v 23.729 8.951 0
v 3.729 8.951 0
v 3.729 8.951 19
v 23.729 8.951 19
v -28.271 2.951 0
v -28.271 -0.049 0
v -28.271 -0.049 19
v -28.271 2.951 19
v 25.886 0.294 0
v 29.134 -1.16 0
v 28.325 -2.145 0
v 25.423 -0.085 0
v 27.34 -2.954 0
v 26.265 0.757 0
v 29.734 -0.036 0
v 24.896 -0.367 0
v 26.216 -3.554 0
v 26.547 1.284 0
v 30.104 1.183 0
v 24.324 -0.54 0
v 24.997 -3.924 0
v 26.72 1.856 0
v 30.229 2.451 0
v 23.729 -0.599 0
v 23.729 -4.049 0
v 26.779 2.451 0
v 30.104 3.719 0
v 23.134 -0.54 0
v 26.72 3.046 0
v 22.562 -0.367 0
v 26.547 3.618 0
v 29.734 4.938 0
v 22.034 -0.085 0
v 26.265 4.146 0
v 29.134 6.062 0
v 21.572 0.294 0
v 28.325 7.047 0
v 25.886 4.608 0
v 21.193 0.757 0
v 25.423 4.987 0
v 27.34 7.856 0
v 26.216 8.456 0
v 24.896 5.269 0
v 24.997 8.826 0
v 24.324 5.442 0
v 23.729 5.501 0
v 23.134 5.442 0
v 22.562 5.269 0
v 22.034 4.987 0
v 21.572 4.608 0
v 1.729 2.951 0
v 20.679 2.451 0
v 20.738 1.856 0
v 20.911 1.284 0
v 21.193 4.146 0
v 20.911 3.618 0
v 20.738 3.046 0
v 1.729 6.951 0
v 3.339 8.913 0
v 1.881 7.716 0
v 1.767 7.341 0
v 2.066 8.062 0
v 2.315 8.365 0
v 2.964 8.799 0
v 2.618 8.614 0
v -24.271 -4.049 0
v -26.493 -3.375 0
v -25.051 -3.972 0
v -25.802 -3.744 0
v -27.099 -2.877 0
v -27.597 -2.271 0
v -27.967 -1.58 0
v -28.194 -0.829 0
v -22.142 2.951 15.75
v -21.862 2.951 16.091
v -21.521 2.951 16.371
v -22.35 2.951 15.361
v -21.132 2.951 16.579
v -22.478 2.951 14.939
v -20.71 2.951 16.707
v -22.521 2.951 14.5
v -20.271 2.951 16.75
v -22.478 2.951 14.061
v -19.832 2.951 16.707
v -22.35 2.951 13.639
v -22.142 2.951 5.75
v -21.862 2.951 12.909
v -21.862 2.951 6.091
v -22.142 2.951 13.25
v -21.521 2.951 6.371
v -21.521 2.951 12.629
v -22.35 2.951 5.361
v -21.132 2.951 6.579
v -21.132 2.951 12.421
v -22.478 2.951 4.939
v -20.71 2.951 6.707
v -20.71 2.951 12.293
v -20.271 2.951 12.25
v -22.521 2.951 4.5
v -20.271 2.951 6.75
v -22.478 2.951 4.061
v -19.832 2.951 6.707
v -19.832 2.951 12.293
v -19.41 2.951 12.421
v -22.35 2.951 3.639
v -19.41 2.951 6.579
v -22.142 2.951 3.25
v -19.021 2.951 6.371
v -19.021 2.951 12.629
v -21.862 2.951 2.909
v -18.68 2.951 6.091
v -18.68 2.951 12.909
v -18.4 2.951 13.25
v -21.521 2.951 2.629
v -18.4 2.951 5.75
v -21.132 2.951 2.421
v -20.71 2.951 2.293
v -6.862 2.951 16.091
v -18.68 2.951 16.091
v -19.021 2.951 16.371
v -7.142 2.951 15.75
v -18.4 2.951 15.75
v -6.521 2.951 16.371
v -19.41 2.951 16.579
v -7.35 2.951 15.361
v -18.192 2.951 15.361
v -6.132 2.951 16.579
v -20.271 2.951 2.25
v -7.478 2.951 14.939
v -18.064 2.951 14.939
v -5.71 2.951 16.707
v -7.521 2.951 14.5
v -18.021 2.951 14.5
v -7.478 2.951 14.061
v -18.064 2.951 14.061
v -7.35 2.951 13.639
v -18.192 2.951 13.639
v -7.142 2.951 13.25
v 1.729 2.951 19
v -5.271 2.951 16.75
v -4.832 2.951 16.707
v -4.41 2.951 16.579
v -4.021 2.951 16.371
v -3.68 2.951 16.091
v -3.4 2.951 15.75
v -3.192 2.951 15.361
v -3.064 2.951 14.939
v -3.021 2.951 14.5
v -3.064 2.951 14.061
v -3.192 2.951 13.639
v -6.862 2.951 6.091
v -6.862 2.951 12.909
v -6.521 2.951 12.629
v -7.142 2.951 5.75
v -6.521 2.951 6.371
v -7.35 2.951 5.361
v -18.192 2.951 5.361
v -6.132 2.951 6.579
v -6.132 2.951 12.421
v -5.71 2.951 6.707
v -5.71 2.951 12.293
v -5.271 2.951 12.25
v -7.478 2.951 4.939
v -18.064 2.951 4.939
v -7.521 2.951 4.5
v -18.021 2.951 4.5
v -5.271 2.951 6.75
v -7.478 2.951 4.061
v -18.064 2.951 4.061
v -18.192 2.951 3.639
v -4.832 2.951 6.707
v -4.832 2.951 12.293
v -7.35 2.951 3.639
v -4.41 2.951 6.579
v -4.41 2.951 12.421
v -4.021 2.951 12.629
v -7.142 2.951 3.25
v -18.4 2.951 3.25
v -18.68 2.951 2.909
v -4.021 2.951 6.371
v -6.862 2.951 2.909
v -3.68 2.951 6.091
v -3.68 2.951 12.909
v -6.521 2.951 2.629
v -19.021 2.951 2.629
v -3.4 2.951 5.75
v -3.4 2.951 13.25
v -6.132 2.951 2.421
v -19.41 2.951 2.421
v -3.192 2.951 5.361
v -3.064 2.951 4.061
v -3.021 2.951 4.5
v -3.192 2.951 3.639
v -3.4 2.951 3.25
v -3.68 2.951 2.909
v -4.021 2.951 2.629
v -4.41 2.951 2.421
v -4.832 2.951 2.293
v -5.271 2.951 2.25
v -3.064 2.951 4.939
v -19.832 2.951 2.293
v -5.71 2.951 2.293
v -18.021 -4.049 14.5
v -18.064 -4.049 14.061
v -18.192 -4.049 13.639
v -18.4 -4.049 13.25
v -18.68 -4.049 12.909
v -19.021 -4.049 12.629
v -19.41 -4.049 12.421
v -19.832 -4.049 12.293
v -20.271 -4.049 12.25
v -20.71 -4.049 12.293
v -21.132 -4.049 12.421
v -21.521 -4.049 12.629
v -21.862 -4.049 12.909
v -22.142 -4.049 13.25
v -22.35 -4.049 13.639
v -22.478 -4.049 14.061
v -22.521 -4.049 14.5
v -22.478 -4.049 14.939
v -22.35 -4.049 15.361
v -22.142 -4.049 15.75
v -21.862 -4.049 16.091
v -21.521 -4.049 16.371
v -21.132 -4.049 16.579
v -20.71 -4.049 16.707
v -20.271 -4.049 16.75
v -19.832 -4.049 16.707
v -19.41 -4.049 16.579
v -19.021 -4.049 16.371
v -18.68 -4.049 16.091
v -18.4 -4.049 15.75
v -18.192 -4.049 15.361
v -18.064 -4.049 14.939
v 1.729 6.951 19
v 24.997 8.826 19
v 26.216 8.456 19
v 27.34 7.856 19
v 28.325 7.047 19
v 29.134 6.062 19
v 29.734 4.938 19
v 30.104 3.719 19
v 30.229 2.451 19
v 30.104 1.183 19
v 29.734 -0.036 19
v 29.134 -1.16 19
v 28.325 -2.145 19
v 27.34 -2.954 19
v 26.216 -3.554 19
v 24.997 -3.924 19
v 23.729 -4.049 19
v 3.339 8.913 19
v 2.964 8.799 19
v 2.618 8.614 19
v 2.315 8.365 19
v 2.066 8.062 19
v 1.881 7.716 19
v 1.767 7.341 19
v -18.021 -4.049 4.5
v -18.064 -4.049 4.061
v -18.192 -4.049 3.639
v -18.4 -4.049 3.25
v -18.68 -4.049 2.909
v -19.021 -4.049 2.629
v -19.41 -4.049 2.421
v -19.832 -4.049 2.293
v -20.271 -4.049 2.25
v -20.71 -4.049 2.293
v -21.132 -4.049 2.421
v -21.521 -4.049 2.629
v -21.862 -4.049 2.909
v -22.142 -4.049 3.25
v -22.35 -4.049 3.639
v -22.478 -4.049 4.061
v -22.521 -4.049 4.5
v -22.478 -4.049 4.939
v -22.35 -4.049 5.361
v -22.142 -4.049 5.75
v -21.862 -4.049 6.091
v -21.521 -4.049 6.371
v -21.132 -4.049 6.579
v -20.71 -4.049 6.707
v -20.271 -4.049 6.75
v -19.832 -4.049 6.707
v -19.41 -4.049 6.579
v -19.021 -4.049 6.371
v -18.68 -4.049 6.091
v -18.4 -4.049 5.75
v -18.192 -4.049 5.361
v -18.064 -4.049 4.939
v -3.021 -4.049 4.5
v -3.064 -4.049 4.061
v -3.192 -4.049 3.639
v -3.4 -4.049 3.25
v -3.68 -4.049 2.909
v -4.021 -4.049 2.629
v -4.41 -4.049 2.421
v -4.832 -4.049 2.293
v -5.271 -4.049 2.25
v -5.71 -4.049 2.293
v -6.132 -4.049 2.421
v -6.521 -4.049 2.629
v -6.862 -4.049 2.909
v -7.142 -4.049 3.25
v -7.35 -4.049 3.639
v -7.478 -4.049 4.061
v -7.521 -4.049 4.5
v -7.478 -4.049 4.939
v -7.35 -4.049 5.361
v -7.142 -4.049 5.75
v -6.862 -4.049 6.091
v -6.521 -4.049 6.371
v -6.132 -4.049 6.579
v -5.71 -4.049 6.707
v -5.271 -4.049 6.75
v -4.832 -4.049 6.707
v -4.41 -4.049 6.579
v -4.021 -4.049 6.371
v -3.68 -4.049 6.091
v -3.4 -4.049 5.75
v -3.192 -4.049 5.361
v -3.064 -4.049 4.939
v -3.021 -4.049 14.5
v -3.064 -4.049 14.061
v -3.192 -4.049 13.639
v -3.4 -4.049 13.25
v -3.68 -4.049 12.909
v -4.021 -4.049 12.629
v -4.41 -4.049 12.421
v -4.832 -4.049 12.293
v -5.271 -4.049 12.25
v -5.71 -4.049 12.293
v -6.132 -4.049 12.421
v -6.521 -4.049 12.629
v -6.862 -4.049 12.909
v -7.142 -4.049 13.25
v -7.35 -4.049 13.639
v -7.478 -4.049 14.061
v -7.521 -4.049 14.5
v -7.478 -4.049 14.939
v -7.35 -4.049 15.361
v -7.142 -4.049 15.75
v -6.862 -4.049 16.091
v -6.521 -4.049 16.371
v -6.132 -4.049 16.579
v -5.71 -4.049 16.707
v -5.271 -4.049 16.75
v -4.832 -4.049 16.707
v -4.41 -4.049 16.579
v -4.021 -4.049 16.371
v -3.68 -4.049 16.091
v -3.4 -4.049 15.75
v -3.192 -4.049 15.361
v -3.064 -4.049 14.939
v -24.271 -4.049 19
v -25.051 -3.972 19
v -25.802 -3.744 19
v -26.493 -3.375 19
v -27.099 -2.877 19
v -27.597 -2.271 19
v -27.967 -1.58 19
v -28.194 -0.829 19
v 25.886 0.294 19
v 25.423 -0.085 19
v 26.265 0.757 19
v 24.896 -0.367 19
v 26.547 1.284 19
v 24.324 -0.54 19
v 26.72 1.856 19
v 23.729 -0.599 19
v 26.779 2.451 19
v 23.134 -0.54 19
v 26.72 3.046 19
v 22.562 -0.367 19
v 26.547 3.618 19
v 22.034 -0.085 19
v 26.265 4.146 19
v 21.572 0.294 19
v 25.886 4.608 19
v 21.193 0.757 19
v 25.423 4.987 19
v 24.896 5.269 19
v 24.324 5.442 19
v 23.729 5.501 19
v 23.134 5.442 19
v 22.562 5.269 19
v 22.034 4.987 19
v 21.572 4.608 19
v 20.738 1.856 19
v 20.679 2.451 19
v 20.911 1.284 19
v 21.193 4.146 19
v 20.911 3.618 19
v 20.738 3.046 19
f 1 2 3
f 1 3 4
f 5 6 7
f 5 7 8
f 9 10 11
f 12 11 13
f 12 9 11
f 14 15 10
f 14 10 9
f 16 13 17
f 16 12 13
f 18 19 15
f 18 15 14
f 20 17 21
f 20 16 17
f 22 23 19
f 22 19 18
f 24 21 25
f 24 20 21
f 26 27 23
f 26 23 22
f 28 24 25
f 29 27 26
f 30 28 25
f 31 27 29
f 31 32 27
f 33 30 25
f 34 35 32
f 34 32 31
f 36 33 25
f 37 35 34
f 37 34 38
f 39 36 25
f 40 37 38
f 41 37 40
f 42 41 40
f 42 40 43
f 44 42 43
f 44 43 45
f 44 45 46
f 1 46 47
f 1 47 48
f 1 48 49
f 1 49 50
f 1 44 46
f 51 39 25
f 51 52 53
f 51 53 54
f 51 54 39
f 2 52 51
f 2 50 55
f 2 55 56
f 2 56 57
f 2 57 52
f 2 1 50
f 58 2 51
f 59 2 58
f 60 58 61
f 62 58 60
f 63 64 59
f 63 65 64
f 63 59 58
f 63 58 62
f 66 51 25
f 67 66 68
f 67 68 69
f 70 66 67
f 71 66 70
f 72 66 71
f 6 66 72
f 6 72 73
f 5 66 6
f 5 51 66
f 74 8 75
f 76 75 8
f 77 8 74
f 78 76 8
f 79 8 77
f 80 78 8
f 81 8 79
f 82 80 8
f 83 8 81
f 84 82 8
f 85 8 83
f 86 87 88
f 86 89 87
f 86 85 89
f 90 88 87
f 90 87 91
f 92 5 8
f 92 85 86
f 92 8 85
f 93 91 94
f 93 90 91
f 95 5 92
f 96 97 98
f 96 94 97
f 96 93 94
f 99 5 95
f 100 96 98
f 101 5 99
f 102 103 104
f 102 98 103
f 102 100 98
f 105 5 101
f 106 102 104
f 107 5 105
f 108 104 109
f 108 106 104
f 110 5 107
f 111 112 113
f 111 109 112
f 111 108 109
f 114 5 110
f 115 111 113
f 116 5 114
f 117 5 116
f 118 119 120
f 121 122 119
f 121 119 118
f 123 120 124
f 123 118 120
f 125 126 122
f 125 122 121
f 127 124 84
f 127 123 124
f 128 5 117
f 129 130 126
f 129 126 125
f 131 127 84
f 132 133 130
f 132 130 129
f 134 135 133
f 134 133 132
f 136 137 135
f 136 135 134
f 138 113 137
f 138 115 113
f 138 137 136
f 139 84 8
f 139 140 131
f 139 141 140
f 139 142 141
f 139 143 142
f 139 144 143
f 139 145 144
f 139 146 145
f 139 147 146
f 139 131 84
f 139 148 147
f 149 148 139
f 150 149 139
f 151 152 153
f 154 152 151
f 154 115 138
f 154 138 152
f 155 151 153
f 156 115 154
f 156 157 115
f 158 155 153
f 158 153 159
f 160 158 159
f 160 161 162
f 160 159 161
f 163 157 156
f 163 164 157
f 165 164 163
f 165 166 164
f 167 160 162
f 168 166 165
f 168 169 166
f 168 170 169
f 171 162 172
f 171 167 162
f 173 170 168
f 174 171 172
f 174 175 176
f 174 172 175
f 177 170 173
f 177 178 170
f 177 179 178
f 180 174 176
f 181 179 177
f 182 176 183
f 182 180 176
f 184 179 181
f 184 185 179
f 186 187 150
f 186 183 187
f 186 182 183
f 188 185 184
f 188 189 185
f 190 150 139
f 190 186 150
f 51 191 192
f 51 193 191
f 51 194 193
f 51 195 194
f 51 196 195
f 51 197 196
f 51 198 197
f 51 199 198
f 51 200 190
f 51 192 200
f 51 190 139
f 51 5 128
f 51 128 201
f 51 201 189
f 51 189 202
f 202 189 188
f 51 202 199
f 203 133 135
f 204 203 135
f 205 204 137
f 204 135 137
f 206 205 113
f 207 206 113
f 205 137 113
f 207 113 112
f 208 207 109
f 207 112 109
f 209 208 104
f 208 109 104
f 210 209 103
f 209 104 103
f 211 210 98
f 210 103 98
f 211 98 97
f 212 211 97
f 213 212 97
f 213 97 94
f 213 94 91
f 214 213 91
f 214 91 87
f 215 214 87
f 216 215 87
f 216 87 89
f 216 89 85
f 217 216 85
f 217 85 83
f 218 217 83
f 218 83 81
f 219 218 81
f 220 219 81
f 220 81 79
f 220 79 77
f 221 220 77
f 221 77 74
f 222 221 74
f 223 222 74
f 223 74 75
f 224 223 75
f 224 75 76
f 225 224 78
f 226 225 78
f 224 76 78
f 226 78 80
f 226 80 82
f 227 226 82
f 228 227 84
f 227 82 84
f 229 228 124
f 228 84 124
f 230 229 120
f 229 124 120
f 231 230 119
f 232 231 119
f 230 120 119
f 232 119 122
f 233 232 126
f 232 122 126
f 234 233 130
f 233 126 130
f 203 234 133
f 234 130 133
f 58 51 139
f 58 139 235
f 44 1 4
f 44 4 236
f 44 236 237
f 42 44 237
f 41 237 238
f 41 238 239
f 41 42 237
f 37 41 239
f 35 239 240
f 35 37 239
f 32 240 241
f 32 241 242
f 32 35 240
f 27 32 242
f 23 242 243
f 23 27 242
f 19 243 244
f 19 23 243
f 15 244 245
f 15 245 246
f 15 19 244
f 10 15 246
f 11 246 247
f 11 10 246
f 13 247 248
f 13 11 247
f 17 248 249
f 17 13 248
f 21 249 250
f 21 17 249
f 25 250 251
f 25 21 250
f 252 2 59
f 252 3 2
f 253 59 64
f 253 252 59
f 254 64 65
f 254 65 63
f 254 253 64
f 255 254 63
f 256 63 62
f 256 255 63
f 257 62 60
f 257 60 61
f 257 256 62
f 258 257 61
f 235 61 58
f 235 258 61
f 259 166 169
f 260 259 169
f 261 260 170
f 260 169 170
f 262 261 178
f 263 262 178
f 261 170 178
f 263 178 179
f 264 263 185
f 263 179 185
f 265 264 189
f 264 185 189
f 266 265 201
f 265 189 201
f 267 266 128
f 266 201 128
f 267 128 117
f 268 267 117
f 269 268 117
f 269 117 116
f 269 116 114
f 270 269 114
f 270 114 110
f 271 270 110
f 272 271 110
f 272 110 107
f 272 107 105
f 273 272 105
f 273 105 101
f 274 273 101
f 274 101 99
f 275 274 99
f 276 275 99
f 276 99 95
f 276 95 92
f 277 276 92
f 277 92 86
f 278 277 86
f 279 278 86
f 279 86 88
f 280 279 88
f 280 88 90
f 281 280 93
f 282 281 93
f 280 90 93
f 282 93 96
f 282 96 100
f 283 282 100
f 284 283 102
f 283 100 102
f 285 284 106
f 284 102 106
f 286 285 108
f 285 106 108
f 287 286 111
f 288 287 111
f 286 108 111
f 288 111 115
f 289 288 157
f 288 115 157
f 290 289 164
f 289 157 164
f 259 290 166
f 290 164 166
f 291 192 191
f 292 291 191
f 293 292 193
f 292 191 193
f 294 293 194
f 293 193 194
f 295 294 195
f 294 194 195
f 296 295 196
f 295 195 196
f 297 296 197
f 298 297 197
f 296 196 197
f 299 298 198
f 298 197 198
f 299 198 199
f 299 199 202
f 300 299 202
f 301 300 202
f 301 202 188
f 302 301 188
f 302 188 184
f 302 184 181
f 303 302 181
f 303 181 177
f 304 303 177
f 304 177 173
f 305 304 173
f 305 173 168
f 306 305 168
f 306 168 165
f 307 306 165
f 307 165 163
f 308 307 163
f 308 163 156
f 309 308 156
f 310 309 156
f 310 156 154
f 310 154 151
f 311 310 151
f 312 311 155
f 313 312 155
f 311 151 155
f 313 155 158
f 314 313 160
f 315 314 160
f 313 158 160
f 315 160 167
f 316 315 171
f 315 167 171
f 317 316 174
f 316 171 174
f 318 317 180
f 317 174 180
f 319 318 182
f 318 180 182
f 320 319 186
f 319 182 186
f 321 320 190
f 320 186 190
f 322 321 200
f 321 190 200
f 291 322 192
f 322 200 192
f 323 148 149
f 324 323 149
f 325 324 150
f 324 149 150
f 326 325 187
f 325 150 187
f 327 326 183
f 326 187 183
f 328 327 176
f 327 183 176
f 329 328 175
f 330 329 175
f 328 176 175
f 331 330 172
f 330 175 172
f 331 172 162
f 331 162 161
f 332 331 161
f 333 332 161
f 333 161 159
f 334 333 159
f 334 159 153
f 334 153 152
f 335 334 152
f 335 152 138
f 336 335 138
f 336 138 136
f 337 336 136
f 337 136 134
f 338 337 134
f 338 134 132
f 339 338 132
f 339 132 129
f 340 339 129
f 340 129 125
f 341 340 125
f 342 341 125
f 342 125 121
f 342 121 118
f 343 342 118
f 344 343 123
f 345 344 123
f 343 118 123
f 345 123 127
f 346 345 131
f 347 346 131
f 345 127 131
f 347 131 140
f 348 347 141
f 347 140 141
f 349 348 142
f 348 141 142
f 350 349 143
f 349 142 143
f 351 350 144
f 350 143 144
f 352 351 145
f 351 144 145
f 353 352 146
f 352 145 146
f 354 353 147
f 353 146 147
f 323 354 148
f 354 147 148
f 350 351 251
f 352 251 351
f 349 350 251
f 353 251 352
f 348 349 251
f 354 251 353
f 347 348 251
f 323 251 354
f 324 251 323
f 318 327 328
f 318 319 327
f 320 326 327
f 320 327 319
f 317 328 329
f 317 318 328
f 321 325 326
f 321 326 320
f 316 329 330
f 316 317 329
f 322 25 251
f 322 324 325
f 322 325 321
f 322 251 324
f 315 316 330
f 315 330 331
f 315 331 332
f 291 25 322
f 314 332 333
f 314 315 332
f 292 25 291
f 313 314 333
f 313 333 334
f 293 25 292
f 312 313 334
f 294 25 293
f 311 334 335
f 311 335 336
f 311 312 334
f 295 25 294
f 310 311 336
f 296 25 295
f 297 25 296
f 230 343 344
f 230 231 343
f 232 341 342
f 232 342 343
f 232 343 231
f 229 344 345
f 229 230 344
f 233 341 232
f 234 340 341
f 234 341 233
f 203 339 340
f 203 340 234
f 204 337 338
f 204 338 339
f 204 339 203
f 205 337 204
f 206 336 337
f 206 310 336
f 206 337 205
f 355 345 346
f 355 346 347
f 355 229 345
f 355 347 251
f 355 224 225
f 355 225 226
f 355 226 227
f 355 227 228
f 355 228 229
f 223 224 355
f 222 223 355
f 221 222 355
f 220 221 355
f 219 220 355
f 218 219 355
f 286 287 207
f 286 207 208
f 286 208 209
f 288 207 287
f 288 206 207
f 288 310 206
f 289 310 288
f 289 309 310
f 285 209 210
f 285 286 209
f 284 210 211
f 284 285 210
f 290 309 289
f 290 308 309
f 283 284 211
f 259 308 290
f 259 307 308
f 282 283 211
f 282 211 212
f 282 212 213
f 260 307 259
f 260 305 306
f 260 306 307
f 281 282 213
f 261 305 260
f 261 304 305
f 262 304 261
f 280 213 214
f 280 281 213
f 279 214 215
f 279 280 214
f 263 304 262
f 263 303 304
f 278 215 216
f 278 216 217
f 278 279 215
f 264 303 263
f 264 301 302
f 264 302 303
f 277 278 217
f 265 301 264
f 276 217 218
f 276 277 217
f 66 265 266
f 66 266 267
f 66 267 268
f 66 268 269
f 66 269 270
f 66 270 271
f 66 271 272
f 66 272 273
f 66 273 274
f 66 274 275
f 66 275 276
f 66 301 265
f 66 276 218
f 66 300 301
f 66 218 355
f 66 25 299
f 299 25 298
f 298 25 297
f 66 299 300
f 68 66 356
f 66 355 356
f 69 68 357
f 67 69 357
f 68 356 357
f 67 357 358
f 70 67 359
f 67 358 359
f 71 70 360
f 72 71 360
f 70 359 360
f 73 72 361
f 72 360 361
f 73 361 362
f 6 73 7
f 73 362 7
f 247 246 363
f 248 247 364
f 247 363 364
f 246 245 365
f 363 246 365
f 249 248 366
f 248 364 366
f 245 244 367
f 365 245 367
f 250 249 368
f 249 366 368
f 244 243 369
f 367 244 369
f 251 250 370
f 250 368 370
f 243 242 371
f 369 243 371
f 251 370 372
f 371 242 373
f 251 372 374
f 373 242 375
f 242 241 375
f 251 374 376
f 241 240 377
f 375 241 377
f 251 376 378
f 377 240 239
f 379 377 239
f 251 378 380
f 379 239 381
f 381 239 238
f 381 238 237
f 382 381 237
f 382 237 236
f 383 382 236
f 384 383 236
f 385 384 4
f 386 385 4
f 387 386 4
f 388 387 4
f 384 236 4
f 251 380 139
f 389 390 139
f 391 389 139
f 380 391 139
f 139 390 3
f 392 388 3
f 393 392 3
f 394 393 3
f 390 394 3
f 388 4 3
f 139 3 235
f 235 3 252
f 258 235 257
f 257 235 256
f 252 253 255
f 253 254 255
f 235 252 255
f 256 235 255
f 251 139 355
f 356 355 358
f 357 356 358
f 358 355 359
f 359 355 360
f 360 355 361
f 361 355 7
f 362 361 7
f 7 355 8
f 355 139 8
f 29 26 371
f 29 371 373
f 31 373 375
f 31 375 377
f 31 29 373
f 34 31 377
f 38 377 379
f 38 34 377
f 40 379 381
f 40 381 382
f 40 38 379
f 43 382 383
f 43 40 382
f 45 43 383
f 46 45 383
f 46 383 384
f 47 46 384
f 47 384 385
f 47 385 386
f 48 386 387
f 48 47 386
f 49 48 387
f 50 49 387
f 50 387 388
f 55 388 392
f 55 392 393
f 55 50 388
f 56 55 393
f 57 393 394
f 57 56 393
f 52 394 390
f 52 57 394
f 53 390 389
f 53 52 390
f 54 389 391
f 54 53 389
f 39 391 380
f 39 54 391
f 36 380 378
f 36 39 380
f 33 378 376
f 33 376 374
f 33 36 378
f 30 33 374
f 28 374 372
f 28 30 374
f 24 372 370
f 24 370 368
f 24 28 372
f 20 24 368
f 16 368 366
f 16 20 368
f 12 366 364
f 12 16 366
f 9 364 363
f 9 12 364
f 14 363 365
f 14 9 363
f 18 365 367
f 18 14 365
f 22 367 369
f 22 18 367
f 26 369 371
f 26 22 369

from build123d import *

# Parameters (mm, degrees)
SKETCH_1_R          = 3.05
EXTRUDE_1_DEPTH     = 19
SKETCH_2_R          = 2.25
CUT_EXTRUDE_1_DEPTH = 20
FILLET_1_R          = 4
FILLET_2_R          = 2


with BuildPart() as part:
    # 草图1 → 凸台-拉伸1 (new body)
    with BuildSketch(Plane.XY):
        with BuildLine():
            Line((1.728973827, 8.951048951), (23.728973827, 8.951048951))
            ThreePointArc((23.728973827, 8.951048951), (30.228973827, 2.451048951), (23.728973827, -4.048951049))
            Line((23.728973827, -4.048951049), (-28.271026173, -4.048951049))
            Line((-28.271026173, -4.048951049), (-28.271026173, 2.951048951))
            Line((-28.271026173, 2.951048951), (1.728973827, 2.951048951))
            Line((1.728973827, 2.951048951), (1.728973827, 8.951048951))
        make_face()
        with Locations((23.728973827, 2.451048951)):
            Circle(SKETCH_1_R, mode=Mode.SUBTRACT)
    extrude(amount=EXTRUDE_1_DEPTH)

    # 草图2 → 切除-拉伸1 (cut)
    with BuildSketch(Plane(origin=(0, 2.951048951, 0), x_dir=(1, 0, 0), z_dir=(0, 1, 0))):
        with Locations((-20.271026173, -4.5)):
            Circle(SKETCH_2_R)
        with Locations((-5.271026173, -4.5)):
            Circle(SKETCH_2_R)
        with Locations((-5.271026173, -14.5)):
            Circle(SKETCH_2_R)
        with Locations((-20.271026173, -14.5)):
            Circle(SKETCH_2_R)
    extrude(amount=-CUT_EXTRUDE_1_DEPTH, mode=Mode.SUBTRACT)

    # 圆角1
    fillet_1_edges = [part.edges().sort_by_distance(p)[0] for p in [
        (-28.271026173, -4.048951049, 9.5),
    ]]
    fillet(fillet_1_edges, radius=FILLET_1_R)

    # 圆角2
    fillet_2_edges = [part.edges().sort_by_distance(p)[0] for p in [
        (1.728973827, 8.951048951, 9.5),
    ]]
    fillet(fillet_2_edges, radius=FILLET_2_R)


solid = part.part
